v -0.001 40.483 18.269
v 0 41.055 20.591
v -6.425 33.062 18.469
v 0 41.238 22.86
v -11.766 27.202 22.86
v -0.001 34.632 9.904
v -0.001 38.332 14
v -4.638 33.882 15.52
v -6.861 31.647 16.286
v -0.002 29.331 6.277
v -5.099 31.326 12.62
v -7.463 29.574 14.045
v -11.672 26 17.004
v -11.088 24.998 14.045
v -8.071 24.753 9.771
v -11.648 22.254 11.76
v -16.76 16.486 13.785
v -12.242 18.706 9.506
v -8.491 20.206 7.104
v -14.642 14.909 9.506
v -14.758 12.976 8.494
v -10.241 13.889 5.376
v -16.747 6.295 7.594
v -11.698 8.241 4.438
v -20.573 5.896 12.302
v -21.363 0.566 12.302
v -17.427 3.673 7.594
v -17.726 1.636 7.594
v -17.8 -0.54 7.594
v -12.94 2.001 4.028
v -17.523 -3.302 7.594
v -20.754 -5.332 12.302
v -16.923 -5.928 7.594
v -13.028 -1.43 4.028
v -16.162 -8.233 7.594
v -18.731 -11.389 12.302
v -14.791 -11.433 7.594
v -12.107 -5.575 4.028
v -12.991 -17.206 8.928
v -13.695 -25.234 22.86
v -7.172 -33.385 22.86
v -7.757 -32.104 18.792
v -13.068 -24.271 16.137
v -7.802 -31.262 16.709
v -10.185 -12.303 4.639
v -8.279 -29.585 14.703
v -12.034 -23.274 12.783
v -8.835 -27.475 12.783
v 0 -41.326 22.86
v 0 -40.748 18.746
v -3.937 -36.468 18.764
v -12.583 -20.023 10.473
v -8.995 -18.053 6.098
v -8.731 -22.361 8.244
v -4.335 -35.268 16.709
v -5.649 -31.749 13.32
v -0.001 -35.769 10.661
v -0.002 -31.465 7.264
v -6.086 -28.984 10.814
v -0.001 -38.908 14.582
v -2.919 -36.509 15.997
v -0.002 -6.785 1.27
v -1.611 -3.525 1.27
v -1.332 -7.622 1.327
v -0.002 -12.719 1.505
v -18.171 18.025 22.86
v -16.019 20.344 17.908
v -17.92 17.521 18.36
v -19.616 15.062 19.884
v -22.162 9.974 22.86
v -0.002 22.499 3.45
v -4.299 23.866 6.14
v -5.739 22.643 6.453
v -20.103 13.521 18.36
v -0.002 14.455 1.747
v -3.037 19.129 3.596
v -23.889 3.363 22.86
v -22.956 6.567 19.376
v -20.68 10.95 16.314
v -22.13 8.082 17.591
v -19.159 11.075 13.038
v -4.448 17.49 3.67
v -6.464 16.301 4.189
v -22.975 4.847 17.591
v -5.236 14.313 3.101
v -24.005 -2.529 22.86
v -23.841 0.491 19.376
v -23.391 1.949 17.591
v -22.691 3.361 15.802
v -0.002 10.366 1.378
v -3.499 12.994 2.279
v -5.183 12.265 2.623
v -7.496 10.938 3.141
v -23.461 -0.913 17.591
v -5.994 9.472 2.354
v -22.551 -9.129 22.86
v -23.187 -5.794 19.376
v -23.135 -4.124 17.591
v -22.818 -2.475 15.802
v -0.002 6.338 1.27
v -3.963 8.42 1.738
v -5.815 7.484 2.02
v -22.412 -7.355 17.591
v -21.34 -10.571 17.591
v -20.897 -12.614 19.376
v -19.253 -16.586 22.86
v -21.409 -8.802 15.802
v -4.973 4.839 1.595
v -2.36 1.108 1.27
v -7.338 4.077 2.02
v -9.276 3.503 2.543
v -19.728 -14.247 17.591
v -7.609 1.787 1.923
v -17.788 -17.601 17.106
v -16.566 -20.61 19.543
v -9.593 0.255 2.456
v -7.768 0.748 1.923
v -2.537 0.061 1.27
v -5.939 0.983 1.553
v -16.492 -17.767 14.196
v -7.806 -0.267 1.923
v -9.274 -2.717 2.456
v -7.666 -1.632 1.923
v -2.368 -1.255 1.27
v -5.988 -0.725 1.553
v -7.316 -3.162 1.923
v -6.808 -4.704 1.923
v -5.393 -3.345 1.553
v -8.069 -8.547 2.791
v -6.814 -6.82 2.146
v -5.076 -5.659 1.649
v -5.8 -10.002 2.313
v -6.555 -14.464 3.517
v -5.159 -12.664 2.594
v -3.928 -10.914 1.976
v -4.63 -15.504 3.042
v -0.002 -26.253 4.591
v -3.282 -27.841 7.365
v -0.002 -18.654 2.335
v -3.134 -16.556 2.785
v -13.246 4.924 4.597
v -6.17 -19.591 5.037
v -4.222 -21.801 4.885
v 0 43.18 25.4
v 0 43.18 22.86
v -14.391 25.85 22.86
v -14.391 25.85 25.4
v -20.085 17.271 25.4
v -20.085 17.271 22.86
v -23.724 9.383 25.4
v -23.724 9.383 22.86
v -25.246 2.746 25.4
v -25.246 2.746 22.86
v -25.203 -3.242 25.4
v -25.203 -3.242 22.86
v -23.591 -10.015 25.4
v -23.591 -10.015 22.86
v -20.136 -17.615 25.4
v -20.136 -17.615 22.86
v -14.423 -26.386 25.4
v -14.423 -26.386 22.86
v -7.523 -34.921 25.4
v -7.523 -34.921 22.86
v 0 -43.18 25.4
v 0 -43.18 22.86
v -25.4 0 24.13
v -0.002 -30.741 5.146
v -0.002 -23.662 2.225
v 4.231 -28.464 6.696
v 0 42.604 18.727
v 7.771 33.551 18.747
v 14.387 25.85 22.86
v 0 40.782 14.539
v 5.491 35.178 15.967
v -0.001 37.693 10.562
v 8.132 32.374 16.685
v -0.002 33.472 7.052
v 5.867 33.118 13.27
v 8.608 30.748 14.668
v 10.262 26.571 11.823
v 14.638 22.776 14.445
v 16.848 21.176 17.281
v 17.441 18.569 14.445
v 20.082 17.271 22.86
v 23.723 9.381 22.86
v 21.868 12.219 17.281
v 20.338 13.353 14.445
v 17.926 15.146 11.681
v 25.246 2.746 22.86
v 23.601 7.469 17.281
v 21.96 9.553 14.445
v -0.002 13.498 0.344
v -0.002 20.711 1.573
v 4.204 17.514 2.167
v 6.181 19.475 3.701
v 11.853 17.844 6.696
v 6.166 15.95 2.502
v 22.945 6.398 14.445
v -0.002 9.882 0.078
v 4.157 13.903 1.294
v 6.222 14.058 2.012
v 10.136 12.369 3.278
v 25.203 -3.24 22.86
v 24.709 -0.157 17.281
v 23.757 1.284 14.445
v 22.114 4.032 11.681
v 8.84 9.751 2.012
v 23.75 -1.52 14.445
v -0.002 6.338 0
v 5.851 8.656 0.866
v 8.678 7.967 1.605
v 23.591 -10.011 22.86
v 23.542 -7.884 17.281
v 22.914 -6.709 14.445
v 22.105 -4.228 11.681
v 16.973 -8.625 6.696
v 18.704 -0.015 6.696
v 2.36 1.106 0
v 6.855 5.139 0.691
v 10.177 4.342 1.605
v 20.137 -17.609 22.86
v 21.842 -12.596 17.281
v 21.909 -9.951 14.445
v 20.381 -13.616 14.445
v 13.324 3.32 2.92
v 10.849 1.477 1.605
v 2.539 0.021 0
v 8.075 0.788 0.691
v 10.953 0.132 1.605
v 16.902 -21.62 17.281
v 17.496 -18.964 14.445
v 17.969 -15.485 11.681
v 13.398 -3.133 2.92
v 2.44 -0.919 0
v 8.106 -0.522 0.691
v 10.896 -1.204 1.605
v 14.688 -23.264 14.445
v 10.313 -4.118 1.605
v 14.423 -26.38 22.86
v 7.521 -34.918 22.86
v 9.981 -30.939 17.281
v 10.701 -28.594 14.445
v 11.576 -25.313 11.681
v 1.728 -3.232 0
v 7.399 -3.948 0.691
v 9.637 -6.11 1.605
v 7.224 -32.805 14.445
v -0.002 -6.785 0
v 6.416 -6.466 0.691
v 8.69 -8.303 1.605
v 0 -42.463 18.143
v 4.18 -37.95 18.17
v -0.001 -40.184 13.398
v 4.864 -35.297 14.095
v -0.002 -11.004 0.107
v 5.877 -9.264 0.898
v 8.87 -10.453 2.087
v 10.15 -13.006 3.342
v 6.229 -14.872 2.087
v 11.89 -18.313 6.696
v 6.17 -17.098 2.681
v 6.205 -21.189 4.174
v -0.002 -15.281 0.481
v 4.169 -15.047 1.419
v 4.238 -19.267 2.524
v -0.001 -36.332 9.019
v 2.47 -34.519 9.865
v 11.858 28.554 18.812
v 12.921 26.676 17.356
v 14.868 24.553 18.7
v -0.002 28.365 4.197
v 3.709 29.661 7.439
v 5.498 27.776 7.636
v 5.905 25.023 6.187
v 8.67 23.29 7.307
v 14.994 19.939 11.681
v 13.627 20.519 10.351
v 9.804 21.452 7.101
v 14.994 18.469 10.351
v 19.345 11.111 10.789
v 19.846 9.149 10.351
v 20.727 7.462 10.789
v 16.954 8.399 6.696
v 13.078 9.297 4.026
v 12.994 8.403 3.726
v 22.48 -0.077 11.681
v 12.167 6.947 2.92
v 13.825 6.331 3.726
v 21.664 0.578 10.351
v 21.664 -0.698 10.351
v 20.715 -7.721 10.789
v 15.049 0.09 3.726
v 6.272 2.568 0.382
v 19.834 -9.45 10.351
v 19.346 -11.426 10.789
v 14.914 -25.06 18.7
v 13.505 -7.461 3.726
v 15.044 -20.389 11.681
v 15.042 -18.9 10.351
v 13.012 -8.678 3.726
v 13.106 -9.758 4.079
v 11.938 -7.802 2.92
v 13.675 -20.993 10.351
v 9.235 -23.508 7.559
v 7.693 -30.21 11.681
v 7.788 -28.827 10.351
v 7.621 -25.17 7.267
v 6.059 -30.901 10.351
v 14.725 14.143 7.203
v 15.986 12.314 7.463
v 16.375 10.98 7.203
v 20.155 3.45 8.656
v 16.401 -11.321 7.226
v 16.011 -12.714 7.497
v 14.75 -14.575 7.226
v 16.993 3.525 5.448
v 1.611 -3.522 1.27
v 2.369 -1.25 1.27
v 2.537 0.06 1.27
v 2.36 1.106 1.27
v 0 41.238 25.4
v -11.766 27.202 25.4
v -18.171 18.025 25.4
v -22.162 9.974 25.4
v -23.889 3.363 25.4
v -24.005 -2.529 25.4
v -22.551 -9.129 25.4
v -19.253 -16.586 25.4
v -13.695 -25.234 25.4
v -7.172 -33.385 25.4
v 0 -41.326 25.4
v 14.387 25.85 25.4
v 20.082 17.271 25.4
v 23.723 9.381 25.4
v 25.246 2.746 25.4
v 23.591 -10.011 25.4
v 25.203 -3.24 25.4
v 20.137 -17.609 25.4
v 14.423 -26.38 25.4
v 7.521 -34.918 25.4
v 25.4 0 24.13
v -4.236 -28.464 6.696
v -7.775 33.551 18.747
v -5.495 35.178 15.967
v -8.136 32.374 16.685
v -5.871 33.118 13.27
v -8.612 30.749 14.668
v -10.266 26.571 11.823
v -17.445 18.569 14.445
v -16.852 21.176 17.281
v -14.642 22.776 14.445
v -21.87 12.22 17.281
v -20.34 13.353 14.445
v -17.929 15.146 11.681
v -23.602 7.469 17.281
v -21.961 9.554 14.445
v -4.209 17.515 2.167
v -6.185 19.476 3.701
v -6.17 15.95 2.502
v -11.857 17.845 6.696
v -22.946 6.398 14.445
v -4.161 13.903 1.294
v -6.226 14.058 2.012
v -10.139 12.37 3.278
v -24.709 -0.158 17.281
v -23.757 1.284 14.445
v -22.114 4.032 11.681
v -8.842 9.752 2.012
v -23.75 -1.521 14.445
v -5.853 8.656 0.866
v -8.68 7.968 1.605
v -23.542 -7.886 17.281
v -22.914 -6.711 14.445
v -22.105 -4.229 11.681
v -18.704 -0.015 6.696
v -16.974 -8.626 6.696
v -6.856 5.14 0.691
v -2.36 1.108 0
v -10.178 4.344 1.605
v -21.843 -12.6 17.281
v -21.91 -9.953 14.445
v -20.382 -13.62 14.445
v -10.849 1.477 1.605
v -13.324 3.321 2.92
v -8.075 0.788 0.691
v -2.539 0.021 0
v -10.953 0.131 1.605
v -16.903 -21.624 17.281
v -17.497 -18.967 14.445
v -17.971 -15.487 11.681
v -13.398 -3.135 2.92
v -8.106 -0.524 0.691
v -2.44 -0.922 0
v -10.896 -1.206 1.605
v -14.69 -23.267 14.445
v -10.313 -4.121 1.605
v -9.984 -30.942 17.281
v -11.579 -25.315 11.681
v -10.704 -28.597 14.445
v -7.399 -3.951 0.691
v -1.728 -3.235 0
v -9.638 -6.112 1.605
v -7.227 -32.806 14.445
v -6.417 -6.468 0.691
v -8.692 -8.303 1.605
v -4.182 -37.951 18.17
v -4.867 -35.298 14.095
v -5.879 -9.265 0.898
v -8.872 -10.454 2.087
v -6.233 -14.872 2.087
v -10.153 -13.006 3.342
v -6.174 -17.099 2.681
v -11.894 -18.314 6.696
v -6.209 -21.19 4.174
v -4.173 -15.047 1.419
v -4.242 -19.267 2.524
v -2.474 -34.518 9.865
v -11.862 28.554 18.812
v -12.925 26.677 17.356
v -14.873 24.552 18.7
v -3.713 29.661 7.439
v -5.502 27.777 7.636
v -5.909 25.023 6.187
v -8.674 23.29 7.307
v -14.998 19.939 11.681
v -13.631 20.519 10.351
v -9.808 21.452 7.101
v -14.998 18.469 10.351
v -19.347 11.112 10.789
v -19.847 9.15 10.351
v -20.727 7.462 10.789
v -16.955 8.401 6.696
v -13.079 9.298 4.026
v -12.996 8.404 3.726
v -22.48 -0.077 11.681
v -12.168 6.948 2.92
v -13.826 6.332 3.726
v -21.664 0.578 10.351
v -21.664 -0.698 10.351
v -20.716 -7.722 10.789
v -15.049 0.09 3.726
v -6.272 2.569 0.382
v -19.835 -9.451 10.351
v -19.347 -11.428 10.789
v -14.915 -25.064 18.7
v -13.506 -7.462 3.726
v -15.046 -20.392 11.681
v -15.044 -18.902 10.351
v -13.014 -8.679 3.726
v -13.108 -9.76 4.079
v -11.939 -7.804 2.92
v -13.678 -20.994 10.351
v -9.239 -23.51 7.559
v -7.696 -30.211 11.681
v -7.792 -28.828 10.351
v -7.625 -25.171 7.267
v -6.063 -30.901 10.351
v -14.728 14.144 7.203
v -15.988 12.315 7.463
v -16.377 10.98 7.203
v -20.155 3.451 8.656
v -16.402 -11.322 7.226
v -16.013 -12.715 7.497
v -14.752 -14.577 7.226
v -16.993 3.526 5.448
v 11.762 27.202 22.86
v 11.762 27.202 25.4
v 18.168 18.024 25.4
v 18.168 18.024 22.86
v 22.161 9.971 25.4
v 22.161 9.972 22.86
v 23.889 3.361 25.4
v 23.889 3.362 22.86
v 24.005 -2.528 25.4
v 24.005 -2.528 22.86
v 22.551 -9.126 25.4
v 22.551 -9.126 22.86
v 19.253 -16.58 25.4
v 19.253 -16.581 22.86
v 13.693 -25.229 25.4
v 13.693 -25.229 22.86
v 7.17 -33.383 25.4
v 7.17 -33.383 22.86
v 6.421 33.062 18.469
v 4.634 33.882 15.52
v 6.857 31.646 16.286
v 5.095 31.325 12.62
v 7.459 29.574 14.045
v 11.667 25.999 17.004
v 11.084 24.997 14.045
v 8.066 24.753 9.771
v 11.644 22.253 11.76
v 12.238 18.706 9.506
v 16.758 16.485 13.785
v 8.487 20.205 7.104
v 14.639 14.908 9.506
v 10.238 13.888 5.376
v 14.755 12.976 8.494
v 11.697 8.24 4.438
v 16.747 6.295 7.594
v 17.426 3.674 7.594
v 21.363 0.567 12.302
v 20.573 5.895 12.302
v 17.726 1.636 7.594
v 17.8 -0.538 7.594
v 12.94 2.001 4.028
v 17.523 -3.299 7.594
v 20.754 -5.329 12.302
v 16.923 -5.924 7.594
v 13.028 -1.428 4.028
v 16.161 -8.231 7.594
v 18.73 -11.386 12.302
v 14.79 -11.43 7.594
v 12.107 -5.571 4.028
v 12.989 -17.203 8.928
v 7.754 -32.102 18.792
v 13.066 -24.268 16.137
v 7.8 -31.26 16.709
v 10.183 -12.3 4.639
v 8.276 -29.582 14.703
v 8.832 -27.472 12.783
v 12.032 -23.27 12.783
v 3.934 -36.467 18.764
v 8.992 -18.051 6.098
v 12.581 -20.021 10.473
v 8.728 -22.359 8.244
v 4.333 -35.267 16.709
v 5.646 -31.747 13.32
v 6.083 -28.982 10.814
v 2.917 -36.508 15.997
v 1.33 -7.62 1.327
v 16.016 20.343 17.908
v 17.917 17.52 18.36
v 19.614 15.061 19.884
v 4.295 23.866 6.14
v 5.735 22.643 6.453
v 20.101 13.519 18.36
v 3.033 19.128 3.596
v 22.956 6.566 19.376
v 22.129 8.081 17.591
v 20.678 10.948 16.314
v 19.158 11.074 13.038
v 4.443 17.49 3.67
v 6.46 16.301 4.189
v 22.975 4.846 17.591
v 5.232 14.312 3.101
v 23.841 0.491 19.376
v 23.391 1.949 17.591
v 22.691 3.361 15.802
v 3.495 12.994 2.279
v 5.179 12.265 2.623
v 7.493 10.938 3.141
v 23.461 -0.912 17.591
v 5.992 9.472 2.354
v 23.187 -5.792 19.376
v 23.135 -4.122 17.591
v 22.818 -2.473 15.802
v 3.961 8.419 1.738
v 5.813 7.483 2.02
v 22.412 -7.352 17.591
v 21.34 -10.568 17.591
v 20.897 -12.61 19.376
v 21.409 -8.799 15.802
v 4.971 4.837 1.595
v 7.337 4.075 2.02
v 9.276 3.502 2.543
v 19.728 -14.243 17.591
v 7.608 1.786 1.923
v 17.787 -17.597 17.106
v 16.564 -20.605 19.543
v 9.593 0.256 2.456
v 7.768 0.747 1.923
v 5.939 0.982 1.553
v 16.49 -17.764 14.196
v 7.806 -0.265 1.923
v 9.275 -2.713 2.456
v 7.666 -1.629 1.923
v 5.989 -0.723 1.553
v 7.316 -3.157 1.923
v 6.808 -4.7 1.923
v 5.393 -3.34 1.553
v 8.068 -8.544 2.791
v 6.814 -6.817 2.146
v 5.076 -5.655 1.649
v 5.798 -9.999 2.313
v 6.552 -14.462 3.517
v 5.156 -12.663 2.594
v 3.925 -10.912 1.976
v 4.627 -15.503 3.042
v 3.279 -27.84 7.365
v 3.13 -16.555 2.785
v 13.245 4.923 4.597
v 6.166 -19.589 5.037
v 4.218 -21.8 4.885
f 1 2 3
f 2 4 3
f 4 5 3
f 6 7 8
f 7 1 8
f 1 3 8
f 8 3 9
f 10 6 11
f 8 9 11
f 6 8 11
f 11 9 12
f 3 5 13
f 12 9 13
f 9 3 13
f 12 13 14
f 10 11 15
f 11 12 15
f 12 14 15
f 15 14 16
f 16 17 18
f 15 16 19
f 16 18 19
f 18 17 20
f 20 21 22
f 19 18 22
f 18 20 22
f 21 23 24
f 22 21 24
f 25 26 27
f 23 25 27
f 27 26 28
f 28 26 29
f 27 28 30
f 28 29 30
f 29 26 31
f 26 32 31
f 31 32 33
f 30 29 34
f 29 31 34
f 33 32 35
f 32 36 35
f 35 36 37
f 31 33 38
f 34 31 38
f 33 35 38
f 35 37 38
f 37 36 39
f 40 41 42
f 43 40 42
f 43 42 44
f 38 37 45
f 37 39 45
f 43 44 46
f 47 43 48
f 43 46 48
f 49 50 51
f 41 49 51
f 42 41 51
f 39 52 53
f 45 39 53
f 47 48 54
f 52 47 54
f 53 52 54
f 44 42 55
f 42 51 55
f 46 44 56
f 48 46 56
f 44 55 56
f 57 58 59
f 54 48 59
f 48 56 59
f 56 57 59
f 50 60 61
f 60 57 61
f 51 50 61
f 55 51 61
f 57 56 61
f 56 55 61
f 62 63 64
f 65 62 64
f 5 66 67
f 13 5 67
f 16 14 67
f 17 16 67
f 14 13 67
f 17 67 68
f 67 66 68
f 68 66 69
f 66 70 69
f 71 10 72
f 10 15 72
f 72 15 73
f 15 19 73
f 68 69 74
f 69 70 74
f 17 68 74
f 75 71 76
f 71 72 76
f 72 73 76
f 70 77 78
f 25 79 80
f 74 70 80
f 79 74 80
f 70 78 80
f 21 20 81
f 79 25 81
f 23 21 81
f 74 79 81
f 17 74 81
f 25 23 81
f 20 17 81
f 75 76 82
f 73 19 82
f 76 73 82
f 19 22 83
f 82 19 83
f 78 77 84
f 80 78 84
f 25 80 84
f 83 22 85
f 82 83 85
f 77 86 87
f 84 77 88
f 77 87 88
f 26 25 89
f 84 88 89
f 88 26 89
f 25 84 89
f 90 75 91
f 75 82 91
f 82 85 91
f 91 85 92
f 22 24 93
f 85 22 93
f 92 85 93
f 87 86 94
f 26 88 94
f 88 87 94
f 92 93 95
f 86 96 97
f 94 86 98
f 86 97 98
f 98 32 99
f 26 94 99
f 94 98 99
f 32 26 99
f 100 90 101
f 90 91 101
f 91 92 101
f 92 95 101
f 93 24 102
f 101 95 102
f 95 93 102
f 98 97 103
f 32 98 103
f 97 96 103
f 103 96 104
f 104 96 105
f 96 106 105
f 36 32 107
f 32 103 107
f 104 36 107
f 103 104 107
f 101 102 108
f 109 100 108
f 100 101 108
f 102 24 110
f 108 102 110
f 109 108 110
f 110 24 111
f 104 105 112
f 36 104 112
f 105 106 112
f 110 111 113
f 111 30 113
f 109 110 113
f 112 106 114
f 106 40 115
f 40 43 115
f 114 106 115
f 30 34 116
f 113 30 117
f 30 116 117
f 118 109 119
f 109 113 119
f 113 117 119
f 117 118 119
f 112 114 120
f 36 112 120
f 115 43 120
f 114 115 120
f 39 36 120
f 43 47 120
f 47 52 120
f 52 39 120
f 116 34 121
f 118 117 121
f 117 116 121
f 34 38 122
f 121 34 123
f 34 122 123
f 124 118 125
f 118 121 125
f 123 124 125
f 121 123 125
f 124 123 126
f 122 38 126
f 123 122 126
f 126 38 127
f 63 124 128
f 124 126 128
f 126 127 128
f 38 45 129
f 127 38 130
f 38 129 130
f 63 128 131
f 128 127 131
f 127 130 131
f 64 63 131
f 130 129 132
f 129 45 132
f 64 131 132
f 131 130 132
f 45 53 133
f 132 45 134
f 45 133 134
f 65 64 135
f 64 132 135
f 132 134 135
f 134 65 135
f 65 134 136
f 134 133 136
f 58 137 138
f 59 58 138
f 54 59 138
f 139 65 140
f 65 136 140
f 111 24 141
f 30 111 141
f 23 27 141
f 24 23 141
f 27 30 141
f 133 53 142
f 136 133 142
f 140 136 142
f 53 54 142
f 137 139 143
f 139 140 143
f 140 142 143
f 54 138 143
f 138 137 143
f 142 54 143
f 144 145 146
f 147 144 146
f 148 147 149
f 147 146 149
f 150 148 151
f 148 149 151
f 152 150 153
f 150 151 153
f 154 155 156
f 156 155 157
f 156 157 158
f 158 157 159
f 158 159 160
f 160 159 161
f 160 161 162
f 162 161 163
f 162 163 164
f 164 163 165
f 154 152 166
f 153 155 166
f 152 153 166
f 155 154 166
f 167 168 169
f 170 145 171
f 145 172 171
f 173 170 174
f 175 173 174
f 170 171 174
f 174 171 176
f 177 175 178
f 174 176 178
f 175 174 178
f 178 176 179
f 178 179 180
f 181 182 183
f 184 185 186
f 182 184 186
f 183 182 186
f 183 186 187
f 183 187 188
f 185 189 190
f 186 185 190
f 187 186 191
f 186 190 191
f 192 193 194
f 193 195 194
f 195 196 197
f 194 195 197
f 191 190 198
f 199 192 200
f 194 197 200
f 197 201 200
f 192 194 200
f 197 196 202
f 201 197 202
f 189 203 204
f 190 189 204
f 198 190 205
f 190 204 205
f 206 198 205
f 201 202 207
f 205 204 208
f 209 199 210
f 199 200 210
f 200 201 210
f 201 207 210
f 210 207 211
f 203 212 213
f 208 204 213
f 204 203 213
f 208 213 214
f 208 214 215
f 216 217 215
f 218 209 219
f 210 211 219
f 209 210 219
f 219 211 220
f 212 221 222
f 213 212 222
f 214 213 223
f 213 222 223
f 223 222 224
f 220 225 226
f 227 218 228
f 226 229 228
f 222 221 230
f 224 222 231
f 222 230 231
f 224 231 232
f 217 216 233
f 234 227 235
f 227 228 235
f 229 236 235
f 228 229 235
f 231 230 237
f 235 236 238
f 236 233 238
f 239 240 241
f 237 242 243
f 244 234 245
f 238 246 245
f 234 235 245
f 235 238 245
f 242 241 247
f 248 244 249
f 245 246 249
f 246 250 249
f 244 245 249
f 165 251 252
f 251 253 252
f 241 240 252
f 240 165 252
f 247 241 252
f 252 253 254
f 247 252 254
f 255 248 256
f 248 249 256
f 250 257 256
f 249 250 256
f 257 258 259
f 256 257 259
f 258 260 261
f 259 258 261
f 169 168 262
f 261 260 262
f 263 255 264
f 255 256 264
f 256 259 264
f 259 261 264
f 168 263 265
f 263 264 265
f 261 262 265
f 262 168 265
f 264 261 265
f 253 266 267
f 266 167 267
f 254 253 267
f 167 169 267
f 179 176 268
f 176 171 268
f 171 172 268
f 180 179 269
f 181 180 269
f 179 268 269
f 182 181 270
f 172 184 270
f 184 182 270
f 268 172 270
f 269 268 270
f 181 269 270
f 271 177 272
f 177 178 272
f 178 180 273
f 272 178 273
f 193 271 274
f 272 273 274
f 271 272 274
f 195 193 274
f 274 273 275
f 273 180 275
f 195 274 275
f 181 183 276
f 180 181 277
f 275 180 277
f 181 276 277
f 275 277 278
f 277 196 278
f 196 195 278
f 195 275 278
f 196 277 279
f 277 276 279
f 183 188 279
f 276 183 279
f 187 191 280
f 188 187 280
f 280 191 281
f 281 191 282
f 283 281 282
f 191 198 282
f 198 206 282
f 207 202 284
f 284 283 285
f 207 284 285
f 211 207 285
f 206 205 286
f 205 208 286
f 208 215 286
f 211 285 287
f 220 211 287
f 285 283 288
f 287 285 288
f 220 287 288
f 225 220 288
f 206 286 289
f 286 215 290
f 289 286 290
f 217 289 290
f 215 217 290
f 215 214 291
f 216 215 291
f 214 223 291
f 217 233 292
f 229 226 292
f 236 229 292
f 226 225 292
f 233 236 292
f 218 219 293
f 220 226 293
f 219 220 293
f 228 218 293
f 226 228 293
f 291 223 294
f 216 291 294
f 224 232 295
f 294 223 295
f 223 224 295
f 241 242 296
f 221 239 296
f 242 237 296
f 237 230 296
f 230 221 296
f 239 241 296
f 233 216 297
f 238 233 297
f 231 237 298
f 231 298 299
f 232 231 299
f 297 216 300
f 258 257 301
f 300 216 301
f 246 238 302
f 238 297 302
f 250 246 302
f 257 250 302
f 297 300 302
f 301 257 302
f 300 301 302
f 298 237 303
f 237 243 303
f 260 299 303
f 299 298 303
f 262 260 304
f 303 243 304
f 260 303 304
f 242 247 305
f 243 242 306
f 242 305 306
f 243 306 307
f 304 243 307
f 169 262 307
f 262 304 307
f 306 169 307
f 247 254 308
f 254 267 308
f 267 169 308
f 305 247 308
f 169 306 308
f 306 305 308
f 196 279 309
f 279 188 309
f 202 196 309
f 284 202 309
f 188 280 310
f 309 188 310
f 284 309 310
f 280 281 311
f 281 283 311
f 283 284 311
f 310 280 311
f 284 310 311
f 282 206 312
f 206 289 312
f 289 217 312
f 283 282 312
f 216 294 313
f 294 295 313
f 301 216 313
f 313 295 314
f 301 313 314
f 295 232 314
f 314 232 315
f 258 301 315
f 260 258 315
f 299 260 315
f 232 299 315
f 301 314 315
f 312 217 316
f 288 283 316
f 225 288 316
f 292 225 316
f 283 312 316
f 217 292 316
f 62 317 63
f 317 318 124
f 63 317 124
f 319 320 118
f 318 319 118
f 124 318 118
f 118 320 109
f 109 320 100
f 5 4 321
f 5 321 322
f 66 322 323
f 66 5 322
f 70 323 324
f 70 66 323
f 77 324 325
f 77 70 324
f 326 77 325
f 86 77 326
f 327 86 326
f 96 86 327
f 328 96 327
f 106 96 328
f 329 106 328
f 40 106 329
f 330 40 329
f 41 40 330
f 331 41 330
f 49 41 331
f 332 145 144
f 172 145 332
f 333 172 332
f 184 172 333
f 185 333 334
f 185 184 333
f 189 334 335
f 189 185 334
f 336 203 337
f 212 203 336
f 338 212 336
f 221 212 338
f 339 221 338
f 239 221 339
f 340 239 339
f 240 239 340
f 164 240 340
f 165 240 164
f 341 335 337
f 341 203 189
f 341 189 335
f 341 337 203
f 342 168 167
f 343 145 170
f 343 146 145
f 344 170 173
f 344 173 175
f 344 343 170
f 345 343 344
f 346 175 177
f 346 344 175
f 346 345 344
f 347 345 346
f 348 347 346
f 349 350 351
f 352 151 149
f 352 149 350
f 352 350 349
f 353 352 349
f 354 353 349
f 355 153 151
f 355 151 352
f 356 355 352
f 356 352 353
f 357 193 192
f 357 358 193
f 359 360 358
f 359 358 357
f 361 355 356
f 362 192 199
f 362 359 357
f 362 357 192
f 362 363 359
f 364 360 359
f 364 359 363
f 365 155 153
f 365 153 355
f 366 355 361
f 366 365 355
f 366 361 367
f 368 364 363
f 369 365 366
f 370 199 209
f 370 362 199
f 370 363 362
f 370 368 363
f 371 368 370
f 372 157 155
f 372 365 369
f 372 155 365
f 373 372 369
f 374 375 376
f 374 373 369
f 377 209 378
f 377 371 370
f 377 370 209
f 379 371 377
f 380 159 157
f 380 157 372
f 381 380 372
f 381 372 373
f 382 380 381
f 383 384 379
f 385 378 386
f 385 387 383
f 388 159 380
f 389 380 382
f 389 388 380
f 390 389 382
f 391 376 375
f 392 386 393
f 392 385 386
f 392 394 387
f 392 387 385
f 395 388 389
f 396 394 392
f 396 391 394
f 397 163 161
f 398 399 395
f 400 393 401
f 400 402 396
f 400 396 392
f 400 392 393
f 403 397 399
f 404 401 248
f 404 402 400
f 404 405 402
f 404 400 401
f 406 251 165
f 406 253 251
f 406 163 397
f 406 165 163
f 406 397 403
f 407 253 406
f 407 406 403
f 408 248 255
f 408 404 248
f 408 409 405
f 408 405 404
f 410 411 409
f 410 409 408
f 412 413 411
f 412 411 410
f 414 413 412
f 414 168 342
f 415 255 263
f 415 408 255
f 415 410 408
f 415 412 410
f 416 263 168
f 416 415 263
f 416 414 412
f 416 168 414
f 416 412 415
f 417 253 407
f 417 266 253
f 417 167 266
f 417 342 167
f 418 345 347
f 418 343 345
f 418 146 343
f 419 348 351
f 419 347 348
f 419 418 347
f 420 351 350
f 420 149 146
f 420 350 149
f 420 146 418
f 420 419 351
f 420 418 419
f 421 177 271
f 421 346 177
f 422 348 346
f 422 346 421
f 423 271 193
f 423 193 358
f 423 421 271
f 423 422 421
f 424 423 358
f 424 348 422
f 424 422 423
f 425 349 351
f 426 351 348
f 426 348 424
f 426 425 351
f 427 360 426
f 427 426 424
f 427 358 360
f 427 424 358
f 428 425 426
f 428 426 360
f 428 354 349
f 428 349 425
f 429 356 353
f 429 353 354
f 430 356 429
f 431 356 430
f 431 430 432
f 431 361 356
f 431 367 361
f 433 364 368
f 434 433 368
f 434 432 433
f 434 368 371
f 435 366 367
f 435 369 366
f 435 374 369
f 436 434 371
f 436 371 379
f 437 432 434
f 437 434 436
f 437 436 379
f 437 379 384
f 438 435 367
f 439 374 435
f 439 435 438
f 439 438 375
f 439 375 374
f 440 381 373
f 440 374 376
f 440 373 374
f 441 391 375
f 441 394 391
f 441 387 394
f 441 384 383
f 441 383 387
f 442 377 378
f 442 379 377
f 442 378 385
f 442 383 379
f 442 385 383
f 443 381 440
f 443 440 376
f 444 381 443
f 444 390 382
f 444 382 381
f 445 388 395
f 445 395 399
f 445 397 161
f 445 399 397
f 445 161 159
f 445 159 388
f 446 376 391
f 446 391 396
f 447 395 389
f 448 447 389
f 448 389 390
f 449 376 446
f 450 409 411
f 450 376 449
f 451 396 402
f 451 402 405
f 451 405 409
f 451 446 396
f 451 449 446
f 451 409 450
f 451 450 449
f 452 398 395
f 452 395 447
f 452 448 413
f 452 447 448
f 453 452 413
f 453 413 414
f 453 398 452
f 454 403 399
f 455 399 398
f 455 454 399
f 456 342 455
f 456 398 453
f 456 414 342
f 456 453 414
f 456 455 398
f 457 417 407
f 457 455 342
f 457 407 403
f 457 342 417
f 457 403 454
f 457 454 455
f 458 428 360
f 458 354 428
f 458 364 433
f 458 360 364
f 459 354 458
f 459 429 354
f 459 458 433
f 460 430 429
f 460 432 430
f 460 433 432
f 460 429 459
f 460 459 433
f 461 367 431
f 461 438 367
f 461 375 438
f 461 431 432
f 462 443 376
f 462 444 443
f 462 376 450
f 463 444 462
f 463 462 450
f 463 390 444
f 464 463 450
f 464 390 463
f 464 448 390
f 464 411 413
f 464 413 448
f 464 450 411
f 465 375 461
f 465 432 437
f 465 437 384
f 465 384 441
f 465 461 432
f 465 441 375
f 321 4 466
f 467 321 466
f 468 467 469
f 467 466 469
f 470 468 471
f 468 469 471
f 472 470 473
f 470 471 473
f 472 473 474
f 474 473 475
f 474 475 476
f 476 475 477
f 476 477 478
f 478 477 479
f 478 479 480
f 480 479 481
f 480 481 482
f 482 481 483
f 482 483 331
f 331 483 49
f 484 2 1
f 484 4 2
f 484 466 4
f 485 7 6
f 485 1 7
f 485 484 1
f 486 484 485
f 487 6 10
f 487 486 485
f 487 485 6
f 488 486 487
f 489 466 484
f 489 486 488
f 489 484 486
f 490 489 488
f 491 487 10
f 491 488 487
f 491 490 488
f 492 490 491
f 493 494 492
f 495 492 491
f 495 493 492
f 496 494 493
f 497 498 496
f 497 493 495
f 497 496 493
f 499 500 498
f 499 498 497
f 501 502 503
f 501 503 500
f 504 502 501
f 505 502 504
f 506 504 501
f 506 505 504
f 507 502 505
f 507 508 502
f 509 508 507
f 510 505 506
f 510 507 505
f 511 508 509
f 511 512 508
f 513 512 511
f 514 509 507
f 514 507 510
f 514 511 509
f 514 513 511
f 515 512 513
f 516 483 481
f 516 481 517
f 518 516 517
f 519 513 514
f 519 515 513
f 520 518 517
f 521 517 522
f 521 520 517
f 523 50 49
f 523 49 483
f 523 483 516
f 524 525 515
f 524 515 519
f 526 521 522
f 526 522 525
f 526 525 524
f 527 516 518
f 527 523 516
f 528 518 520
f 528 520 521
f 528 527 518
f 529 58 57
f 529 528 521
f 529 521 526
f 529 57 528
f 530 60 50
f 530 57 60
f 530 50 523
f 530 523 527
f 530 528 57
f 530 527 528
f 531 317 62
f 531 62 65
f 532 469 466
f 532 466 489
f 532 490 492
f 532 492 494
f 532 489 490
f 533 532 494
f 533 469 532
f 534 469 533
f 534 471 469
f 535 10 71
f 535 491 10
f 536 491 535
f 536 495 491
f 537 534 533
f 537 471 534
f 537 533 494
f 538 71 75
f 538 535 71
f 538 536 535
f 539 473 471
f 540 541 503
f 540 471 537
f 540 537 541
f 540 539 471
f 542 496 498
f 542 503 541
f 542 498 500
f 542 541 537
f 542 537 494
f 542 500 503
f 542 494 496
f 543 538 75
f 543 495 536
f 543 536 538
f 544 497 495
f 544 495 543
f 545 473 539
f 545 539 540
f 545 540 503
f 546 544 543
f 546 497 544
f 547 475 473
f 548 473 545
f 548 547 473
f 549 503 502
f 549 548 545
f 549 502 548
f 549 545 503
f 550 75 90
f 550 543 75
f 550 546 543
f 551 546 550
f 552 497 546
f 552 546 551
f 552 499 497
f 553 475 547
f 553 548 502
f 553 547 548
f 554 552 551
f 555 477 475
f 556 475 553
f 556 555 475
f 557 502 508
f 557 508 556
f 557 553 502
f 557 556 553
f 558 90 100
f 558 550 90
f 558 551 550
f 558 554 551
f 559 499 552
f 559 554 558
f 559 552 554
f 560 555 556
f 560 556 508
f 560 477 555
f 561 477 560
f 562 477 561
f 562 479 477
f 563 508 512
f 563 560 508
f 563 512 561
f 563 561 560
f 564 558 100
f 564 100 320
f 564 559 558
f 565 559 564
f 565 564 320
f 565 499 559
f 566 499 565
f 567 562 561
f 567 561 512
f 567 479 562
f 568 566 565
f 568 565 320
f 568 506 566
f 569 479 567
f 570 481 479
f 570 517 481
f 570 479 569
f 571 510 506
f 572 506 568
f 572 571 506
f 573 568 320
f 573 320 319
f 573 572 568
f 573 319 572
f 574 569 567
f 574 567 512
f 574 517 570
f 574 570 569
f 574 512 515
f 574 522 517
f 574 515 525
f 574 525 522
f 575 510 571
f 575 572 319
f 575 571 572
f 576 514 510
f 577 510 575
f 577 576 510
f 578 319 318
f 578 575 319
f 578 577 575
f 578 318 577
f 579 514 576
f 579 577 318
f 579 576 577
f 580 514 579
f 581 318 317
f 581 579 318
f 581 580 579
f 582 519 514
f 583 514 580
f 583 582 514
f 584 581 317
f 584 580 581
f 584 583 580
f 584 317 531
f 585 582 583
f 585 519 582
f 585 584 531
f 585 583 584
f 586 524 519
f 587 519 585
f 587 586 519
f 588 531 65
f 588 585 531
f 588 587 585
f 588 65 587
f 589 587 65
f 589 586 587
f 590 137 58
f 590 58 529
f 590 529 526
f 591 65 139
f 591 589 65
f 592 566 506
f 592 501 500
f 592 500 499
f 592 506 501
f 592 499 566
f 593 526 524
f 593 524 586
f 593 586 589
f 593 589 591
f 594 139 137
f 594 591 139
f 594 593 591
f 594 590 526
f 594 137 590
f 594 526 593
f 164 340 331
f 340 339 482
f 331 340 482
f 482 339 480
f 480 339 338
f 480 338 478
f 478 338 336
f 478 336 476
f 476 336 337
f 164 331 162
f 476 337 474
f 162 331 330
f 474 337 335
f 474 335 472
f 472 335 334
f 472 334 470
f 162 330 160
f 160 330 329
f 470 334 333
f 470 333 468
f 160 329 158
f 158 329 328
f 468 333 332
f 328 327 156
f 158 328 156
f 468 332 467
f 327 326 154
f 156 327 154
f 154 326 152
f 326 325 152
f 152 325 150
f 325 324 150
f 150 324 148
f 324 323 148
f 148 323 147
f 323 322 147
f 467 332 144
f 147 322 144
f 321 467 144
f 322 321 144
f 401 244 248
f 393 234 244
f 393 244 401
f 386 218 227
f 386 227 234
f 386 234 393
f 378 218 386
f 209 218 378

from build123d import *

# Parameters (mm, degrees)
F1_DEPTH = 25.4
F2_R     = 22.86
F3_T     = 1.27


# Not quite as in the source:
# - a shell that OpenCascade refuses in one call is made with other operations: the cavity is built on its own and cut out


with BuildPart() as f1:
    # F0 (on Top) → F1 (new body)
    with BuildSketch(Plane.XY):
        with BuildLine():
            add(Edge.make_bspline(
                [(0, 43.18), (12.6277618203, 28.5479942033), (38.1078160952, 0.5540033901), (12.7566059893, -29.6560009835), (0, -43.18)],
                knots=[0, 0, 0, 0, 0.5, 1, 1, 1, 1], degree=3))
            add(Edge.make_bspline(
                [(0, 43.18), (-12.6384950786, 28.547848961), (-38.0970572555, 0.5541481006), (-12.7673904104, -29.6561451622), (0, -43.18)],
                knots=[0, 0, 0, 0, 0.5, 1, 1, 1, 1], degree=3))
        make_face()
    extrude(amount=F1_DEPTH)

    # F2
    f2_edges = [f1.edges().sort_by_distance(p)[0] for p in [
        (25.400061, -0.050271, 0),
        (-25.400061, -0.050358, 0),
    ]]
    fillet(f2_edges, radius=F2_R)

    # F3: shell of thickness 1.27, made by hand


with BuildPart() as f3_core1:
    # F3_t2: copy of F1
    add(f1.part)

    # the walls: a layer under each face that stays
    f3_faces = [f3_core1.faces().sort_by_distance(p)[0] for p in [
        (25.4, 0, 24.1299999999),
        (-25.4, 0, 24.1299999999),
        (18.704477423, -0.0148216465, 6.6955389821),
        (-18.704477436, -0.0148275323, 6.6955389821),
        (-1.3114e-06, -0.2233707907, 0),
    ]]
    thicken(f3_faces, amount=-F3_T, mode=Mode.SUBTRACT)


with BuildPart() as f1_1:
    add(f1.part)

    # what is left inside the walls is the cavity
    f3_cavity = [f3_core1.part.solids().sort_by_distance(p)[0] for p in [
        (-2e-06, -13.805023, 25.3873),
    ]]
    add(f3_cavity, mode=Mode.SUBTRACT)


solid = f1_1.part
